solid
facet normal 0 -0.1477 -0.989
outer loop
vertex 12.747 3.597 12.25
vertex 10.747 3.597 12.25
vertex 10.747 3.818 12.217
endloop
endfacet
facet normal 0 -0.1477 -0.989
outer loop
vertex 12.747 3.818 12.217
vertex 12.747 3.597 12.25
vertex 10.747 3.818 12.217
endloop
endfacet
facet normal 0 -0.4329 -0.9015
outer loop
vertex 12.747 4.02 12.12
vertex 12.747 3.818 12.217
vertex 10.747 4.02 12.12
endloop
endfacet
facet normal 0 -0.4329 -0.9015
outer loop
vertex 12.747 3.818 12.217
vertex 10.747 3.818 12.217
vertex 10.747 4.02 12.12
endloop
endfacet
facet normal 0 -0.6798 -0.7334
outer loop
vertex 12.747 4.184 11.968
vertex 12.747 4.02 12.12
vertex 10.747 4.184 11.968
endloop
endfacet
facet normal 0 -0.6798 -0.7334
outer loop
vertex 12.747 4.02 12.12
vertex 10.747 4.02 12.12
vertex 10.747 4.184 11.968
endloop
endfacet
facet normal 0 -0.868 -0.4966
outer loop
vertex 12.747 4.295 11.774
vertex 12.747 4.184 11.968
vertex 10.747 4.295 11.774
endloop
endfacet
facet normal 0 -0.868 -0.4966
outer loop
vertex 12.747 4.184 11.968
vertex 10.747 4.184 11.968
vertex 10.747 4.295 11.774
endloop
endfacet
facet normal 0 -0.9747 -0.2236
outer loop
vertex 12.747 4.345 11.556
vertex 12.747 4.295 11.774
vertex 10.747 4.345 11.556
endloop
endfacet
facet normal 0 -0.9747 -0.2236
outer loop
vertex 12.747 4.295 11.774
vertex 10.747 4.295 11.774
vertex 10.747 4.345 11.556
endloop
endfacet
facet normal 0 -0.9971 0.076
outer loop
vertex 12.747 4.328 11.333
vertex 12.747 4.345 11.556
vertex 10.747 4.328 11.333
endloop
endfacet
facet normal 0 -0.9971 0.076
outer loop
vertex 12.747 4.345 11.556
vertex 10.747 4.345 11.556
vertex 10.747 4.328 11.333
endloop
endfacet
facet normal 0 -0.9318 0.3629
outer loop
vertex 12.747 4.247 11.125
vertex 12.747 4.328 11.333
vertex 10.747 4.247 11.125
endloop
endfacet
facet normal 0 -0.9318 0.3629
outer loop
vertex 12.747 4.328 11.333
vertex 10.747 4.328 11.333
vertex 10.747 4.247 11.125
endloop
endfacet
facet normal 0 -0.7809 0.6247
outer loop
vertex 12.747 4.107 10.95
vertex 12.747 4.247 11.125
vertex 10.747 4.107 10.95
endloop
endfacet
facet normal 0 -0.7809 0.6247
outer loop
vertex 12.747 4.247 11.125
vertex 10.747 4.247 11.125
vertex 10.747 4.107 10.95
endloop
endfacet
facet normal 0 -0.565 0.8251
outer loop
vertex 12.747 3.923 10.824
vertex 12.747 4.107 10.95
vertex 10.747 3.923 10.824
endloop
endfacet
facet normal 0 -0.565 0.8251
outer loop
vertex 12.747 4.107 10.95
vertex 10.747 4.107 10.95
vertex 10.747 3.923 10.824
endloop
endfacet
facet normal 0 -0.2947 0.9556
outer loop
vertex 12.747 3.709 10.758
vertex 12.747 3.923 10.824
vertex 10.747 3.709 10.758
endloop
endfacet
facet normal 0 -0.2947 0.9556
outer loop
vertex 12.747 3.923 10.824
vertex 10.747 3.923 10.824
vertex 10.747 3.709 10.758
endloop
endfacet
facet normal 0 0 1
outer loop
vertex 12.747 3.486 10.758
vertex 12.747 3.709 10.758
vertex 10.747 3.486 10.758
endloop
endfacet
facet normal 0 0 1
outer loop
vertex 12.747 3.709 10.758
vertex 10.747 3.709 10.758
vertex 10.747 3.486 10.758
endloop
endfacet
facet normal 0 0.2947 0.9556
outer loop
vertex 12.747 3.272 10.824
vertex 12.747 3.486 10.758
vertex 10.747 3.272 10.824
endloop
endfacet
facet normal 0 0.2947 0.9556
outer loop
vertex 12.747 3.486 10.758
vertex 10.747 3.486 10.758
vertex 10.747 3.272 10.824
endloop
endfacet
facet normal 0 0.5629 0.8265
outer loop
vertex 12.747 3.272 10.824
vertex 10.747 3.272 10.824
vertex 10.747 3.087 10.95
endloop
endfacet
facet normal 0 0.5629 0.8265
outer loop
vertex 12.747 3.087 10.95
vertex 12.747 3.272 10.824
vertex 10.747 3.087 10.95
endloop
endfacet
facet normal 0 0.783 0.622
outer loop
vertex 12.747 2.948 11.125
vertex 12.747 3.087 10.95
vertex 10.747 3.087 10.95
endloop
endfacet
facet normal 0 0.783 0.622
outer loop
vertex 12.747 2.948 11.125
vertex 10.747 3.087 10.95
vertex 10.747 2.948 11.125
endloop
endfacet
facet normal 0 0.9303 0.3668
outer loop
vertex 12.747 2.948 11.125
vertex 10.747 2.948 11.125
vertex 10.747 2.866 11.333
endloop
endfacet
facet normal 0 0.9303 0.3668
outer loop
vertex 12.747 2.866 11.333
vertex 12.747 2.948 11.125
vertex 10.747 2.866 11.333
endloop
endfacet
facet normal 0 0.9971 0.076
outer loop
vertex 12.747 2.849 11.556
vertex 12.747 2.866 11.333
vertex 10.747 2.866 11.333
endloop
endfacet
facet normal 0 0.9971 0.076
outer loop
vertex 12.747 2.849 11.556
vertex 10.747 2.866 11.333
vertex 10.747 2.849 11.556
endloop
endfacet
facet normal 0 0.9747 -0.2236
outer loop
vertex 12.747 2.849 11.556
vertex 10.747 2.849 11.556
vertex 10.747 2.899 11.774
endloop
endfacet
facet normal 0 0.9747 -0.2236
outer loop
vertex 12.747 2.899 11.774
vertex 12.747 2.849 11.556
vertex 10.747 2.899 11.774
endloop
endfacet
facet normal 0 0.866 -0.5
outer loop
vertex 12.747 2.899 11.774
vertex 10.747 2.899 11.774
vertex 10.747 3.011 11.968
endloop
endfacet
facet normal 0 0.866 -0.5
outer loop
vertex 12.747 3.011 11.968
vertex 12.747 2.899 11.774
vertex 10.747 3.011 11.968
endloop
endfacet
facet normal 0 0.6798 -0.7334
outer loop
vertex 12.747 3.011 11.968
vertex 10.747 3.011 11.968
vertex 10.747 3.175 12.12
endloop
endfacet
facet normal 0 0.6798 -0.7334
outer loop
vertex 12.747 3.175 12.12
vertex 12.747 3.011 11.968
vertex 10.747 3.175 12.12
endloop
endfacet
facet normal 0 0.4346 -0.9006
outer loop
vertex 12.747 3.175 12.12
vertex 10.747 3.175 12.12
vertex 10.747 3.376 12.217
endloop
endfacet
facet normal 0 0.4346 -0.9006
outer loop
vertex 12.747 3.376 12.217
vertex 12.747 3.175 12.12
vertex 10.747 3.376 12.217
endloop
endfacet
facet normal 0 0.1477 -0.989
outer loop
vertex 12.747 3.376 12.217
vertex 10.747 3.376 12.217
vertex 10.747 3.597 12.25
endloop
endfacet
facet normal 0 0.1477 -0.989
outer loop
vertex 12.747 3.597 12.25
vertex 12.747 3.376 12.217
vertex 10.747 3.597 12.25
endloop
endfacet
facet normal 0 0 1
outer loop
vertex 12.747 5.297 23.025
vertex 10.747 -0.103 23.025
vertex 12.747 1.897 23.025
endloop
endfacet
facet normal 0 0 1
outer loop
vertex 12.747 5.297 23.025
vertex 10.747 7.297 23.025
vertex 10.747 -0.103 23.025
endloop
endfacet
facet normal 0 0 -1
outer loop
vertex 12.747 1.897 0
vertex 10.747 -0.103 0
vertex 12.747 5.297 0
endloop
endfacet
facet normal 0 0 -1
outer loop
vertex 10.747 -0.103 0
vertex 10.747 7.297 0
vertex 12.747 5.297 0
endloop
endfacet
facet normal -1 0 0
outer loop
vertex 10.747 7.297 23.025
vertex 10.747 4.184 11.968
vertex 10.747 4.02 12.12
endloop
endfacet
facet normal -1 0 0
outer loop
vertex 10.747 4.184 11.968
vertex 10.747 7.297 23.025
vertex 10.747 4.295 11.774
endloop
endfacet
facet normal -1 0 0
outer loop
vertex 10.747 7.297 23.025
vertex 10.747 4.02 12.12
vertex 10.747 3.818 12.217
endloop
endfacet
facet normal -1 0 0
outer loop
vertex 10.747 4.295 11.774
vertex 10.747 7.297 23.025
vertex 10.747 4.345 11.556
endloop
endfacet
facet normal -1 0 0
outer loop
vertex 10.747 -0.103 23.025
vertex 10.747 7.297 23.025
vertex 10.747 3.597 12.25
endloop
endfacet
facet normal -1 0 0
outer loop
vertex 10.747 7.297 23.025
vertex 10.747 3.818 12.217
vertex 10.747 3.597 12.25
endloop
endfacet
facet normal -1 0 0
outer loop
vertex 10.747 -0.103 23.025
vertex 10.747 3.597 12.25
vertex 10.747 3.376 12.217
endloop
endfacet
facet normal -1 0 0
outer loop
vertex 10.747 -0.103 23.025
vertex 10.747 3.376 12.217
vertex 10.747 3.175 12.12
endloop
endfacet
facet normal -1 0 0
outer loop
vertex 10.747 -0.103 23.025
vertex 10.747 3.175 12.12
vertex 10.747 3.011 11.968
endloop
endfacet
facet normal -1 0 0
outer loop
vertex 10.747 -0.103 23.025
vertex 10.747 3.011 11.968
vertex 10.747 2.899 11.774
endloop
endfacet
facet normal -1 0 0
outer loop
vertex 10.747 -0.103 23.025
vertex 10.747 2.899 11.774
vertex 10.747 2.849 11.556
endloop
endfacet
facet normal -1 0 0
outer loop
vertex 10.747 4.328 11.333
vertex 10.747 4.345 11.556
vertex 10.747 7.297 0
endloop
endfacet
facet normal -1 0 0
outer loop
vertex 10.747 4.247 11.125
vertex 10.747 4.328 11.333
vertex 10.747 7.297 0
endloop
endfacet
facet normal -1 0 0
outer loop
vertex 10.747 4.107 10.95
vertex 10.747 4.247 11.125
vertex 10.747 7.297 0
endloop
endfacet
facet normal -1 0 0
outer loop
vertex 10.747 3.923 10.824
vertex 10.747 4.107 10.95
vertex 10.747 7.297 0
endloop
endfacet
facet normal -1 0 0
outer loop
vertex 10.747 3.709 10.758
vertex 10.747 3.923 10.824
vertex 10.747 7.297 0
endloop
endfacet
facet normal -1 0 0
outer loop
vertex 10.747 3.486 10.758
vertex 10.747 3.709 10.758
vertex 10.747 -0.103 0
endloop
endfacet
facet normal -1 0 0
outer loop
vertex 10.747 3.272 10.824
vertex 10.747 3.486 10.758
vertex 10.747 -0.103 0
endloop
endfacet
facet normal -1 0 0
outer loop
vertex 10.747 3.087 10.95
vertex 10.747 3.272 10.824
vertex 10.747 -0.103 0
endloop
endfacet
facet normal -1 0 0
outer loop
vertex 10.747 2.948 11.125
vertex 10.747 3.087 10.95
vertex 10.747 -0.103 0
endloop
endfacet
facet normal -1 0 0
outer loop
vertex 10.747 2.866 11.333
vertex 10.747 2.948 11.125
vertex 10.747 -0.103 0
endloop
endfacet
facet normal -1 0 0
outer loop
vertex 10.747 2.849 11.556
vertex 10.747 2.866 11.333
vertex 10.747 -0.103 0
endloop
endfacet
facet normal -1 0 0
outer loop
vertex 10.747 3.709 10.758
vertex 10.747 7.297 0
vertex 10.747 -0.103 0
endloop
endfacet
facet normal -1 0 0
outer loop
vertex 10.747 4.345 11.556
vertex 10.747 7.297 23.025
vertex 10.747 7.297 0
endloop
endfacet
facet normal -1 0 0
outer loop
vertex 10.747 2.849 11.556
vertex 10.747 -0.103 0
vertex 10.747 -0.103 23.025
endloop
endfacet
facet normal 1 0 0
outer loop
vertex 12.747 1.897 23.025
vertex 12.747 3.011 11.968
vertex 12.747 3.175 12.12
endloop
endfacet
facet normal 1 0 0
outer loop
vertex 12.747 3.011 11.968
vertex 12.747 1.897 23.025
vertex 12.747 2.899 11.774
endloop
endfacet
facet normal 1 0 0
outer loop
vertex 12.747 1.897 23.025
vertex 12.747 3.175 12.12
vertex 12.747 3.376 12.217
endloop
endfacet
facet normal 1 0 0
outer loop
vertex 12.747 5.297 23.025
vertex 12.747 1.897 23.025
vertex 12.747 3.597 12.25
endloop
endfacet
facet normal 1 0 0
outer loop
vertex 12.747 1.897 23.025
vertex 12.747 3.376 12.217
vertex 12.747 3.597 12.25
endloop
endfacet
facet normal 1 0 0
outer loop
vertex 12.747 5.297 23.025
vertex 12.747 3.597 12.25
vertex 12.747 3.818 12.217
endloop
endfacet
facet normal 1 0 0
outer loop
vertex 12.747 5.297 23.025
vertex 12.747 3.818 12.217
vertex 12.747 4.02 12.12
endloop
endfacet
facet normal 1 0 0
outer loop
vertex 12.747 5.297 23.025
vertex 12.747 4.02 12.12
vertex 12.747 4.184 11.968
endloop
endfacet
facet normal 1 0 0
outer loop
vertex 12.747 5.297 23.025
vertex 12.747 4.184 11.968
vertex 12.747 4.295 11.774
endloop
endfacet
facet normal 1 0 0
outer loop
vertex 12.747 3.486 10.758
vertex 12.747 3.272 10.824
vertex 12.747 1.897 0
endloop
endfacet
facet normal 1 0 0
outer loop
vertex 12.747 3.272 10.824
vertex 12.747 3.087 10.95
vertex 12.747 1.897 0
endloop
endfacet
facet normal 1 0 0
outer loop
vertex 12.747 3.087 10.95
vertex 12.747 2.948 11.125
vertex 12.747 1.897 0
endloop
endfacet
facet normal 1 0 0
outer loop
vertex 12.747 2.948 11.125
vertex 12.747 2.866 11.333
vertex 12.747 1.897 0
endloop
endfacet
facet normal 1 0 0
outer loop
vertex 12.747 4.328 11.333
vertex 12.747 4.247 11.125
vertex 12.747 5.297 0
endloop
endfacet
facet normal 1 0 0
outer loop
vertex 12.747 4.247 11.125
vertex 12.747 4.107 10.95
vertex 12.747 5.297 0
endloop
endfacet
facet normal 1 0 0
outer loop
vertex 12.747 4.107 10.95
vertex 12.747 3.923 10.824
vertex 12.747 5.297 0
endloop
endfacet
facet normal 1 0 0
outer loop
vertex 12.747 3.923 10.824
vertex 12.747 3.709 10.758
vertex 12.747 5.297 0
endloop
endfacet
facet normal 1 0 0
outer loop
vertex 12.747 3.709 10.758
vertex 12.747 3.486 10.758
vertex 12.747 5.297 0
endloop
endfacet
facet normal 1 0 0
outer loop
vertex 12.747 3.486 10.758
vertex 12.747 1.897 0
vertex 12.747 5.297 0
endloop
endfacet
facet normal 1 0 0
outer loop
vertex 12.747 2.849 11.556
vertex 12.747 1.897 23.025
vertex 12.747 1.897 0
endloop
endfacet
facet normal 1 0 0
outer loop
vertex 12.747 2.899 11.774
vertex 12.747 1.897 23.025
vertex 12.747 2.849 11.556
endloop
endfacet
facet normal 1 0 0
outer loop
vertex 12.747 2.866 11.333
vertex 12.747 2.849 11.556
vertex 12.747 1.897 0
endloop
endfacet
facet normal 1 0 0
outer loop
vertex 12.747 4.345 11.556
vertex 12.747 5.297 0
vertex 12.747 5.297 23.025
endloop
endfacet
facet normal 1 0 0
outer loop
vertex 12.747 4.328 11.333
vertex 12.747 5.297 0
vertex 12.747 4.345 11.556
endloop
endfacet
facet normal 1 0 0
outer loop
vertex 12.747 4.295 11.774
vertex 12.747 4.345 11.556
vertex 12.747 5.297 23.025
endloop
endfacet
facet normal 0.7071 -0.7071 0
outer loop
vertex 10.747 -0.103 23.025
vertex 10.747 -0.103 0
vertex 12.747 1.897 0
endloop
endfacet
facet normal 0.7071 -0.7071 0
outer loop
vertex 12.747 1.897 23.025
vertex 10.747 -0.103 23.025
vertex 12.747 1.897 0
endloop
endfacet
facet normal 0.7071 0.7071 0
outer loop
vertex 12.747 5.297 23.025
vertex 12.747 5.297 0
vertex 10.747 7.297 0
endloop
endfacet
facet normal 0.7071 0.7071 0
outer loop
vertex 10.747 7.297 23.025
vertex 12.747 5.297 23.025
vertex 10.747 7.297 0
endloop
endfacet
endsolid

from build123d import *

# Parameters (mm, degrees)
BOSS_EXTRUDE1_DEPTH  = 23.025
F_1_5MM_DOWEL_HOLE_D = 1.5


with BuildPart() as part:
    # Sketch1 → Boss-Extrude1 (new body)
    with BuildSketch(Plane.XY):
        Polygon((10.746560597, -0.102705017), (12.746560597, 1.897294983), (12.746560597, 5.297294983), (10.746560597, 7.297294983), align=None)
    extrude(amount=BOSS_EXTRUDE1_DEPTH)

    # Ø1.5mm Dowel Hole (through all)
    with Locations(Plane(origin=(14.246560597, -88.102705017, 36.5), x_dir=(0, 0, -1), z_dir=(1, 0, 0))):
        with Locations((0, 91.7), (-25, 91.7), (25, 91.7)):
            Hole(F_1_5MM_DOWEL_HOLE_D / 2)


solid = part.part
